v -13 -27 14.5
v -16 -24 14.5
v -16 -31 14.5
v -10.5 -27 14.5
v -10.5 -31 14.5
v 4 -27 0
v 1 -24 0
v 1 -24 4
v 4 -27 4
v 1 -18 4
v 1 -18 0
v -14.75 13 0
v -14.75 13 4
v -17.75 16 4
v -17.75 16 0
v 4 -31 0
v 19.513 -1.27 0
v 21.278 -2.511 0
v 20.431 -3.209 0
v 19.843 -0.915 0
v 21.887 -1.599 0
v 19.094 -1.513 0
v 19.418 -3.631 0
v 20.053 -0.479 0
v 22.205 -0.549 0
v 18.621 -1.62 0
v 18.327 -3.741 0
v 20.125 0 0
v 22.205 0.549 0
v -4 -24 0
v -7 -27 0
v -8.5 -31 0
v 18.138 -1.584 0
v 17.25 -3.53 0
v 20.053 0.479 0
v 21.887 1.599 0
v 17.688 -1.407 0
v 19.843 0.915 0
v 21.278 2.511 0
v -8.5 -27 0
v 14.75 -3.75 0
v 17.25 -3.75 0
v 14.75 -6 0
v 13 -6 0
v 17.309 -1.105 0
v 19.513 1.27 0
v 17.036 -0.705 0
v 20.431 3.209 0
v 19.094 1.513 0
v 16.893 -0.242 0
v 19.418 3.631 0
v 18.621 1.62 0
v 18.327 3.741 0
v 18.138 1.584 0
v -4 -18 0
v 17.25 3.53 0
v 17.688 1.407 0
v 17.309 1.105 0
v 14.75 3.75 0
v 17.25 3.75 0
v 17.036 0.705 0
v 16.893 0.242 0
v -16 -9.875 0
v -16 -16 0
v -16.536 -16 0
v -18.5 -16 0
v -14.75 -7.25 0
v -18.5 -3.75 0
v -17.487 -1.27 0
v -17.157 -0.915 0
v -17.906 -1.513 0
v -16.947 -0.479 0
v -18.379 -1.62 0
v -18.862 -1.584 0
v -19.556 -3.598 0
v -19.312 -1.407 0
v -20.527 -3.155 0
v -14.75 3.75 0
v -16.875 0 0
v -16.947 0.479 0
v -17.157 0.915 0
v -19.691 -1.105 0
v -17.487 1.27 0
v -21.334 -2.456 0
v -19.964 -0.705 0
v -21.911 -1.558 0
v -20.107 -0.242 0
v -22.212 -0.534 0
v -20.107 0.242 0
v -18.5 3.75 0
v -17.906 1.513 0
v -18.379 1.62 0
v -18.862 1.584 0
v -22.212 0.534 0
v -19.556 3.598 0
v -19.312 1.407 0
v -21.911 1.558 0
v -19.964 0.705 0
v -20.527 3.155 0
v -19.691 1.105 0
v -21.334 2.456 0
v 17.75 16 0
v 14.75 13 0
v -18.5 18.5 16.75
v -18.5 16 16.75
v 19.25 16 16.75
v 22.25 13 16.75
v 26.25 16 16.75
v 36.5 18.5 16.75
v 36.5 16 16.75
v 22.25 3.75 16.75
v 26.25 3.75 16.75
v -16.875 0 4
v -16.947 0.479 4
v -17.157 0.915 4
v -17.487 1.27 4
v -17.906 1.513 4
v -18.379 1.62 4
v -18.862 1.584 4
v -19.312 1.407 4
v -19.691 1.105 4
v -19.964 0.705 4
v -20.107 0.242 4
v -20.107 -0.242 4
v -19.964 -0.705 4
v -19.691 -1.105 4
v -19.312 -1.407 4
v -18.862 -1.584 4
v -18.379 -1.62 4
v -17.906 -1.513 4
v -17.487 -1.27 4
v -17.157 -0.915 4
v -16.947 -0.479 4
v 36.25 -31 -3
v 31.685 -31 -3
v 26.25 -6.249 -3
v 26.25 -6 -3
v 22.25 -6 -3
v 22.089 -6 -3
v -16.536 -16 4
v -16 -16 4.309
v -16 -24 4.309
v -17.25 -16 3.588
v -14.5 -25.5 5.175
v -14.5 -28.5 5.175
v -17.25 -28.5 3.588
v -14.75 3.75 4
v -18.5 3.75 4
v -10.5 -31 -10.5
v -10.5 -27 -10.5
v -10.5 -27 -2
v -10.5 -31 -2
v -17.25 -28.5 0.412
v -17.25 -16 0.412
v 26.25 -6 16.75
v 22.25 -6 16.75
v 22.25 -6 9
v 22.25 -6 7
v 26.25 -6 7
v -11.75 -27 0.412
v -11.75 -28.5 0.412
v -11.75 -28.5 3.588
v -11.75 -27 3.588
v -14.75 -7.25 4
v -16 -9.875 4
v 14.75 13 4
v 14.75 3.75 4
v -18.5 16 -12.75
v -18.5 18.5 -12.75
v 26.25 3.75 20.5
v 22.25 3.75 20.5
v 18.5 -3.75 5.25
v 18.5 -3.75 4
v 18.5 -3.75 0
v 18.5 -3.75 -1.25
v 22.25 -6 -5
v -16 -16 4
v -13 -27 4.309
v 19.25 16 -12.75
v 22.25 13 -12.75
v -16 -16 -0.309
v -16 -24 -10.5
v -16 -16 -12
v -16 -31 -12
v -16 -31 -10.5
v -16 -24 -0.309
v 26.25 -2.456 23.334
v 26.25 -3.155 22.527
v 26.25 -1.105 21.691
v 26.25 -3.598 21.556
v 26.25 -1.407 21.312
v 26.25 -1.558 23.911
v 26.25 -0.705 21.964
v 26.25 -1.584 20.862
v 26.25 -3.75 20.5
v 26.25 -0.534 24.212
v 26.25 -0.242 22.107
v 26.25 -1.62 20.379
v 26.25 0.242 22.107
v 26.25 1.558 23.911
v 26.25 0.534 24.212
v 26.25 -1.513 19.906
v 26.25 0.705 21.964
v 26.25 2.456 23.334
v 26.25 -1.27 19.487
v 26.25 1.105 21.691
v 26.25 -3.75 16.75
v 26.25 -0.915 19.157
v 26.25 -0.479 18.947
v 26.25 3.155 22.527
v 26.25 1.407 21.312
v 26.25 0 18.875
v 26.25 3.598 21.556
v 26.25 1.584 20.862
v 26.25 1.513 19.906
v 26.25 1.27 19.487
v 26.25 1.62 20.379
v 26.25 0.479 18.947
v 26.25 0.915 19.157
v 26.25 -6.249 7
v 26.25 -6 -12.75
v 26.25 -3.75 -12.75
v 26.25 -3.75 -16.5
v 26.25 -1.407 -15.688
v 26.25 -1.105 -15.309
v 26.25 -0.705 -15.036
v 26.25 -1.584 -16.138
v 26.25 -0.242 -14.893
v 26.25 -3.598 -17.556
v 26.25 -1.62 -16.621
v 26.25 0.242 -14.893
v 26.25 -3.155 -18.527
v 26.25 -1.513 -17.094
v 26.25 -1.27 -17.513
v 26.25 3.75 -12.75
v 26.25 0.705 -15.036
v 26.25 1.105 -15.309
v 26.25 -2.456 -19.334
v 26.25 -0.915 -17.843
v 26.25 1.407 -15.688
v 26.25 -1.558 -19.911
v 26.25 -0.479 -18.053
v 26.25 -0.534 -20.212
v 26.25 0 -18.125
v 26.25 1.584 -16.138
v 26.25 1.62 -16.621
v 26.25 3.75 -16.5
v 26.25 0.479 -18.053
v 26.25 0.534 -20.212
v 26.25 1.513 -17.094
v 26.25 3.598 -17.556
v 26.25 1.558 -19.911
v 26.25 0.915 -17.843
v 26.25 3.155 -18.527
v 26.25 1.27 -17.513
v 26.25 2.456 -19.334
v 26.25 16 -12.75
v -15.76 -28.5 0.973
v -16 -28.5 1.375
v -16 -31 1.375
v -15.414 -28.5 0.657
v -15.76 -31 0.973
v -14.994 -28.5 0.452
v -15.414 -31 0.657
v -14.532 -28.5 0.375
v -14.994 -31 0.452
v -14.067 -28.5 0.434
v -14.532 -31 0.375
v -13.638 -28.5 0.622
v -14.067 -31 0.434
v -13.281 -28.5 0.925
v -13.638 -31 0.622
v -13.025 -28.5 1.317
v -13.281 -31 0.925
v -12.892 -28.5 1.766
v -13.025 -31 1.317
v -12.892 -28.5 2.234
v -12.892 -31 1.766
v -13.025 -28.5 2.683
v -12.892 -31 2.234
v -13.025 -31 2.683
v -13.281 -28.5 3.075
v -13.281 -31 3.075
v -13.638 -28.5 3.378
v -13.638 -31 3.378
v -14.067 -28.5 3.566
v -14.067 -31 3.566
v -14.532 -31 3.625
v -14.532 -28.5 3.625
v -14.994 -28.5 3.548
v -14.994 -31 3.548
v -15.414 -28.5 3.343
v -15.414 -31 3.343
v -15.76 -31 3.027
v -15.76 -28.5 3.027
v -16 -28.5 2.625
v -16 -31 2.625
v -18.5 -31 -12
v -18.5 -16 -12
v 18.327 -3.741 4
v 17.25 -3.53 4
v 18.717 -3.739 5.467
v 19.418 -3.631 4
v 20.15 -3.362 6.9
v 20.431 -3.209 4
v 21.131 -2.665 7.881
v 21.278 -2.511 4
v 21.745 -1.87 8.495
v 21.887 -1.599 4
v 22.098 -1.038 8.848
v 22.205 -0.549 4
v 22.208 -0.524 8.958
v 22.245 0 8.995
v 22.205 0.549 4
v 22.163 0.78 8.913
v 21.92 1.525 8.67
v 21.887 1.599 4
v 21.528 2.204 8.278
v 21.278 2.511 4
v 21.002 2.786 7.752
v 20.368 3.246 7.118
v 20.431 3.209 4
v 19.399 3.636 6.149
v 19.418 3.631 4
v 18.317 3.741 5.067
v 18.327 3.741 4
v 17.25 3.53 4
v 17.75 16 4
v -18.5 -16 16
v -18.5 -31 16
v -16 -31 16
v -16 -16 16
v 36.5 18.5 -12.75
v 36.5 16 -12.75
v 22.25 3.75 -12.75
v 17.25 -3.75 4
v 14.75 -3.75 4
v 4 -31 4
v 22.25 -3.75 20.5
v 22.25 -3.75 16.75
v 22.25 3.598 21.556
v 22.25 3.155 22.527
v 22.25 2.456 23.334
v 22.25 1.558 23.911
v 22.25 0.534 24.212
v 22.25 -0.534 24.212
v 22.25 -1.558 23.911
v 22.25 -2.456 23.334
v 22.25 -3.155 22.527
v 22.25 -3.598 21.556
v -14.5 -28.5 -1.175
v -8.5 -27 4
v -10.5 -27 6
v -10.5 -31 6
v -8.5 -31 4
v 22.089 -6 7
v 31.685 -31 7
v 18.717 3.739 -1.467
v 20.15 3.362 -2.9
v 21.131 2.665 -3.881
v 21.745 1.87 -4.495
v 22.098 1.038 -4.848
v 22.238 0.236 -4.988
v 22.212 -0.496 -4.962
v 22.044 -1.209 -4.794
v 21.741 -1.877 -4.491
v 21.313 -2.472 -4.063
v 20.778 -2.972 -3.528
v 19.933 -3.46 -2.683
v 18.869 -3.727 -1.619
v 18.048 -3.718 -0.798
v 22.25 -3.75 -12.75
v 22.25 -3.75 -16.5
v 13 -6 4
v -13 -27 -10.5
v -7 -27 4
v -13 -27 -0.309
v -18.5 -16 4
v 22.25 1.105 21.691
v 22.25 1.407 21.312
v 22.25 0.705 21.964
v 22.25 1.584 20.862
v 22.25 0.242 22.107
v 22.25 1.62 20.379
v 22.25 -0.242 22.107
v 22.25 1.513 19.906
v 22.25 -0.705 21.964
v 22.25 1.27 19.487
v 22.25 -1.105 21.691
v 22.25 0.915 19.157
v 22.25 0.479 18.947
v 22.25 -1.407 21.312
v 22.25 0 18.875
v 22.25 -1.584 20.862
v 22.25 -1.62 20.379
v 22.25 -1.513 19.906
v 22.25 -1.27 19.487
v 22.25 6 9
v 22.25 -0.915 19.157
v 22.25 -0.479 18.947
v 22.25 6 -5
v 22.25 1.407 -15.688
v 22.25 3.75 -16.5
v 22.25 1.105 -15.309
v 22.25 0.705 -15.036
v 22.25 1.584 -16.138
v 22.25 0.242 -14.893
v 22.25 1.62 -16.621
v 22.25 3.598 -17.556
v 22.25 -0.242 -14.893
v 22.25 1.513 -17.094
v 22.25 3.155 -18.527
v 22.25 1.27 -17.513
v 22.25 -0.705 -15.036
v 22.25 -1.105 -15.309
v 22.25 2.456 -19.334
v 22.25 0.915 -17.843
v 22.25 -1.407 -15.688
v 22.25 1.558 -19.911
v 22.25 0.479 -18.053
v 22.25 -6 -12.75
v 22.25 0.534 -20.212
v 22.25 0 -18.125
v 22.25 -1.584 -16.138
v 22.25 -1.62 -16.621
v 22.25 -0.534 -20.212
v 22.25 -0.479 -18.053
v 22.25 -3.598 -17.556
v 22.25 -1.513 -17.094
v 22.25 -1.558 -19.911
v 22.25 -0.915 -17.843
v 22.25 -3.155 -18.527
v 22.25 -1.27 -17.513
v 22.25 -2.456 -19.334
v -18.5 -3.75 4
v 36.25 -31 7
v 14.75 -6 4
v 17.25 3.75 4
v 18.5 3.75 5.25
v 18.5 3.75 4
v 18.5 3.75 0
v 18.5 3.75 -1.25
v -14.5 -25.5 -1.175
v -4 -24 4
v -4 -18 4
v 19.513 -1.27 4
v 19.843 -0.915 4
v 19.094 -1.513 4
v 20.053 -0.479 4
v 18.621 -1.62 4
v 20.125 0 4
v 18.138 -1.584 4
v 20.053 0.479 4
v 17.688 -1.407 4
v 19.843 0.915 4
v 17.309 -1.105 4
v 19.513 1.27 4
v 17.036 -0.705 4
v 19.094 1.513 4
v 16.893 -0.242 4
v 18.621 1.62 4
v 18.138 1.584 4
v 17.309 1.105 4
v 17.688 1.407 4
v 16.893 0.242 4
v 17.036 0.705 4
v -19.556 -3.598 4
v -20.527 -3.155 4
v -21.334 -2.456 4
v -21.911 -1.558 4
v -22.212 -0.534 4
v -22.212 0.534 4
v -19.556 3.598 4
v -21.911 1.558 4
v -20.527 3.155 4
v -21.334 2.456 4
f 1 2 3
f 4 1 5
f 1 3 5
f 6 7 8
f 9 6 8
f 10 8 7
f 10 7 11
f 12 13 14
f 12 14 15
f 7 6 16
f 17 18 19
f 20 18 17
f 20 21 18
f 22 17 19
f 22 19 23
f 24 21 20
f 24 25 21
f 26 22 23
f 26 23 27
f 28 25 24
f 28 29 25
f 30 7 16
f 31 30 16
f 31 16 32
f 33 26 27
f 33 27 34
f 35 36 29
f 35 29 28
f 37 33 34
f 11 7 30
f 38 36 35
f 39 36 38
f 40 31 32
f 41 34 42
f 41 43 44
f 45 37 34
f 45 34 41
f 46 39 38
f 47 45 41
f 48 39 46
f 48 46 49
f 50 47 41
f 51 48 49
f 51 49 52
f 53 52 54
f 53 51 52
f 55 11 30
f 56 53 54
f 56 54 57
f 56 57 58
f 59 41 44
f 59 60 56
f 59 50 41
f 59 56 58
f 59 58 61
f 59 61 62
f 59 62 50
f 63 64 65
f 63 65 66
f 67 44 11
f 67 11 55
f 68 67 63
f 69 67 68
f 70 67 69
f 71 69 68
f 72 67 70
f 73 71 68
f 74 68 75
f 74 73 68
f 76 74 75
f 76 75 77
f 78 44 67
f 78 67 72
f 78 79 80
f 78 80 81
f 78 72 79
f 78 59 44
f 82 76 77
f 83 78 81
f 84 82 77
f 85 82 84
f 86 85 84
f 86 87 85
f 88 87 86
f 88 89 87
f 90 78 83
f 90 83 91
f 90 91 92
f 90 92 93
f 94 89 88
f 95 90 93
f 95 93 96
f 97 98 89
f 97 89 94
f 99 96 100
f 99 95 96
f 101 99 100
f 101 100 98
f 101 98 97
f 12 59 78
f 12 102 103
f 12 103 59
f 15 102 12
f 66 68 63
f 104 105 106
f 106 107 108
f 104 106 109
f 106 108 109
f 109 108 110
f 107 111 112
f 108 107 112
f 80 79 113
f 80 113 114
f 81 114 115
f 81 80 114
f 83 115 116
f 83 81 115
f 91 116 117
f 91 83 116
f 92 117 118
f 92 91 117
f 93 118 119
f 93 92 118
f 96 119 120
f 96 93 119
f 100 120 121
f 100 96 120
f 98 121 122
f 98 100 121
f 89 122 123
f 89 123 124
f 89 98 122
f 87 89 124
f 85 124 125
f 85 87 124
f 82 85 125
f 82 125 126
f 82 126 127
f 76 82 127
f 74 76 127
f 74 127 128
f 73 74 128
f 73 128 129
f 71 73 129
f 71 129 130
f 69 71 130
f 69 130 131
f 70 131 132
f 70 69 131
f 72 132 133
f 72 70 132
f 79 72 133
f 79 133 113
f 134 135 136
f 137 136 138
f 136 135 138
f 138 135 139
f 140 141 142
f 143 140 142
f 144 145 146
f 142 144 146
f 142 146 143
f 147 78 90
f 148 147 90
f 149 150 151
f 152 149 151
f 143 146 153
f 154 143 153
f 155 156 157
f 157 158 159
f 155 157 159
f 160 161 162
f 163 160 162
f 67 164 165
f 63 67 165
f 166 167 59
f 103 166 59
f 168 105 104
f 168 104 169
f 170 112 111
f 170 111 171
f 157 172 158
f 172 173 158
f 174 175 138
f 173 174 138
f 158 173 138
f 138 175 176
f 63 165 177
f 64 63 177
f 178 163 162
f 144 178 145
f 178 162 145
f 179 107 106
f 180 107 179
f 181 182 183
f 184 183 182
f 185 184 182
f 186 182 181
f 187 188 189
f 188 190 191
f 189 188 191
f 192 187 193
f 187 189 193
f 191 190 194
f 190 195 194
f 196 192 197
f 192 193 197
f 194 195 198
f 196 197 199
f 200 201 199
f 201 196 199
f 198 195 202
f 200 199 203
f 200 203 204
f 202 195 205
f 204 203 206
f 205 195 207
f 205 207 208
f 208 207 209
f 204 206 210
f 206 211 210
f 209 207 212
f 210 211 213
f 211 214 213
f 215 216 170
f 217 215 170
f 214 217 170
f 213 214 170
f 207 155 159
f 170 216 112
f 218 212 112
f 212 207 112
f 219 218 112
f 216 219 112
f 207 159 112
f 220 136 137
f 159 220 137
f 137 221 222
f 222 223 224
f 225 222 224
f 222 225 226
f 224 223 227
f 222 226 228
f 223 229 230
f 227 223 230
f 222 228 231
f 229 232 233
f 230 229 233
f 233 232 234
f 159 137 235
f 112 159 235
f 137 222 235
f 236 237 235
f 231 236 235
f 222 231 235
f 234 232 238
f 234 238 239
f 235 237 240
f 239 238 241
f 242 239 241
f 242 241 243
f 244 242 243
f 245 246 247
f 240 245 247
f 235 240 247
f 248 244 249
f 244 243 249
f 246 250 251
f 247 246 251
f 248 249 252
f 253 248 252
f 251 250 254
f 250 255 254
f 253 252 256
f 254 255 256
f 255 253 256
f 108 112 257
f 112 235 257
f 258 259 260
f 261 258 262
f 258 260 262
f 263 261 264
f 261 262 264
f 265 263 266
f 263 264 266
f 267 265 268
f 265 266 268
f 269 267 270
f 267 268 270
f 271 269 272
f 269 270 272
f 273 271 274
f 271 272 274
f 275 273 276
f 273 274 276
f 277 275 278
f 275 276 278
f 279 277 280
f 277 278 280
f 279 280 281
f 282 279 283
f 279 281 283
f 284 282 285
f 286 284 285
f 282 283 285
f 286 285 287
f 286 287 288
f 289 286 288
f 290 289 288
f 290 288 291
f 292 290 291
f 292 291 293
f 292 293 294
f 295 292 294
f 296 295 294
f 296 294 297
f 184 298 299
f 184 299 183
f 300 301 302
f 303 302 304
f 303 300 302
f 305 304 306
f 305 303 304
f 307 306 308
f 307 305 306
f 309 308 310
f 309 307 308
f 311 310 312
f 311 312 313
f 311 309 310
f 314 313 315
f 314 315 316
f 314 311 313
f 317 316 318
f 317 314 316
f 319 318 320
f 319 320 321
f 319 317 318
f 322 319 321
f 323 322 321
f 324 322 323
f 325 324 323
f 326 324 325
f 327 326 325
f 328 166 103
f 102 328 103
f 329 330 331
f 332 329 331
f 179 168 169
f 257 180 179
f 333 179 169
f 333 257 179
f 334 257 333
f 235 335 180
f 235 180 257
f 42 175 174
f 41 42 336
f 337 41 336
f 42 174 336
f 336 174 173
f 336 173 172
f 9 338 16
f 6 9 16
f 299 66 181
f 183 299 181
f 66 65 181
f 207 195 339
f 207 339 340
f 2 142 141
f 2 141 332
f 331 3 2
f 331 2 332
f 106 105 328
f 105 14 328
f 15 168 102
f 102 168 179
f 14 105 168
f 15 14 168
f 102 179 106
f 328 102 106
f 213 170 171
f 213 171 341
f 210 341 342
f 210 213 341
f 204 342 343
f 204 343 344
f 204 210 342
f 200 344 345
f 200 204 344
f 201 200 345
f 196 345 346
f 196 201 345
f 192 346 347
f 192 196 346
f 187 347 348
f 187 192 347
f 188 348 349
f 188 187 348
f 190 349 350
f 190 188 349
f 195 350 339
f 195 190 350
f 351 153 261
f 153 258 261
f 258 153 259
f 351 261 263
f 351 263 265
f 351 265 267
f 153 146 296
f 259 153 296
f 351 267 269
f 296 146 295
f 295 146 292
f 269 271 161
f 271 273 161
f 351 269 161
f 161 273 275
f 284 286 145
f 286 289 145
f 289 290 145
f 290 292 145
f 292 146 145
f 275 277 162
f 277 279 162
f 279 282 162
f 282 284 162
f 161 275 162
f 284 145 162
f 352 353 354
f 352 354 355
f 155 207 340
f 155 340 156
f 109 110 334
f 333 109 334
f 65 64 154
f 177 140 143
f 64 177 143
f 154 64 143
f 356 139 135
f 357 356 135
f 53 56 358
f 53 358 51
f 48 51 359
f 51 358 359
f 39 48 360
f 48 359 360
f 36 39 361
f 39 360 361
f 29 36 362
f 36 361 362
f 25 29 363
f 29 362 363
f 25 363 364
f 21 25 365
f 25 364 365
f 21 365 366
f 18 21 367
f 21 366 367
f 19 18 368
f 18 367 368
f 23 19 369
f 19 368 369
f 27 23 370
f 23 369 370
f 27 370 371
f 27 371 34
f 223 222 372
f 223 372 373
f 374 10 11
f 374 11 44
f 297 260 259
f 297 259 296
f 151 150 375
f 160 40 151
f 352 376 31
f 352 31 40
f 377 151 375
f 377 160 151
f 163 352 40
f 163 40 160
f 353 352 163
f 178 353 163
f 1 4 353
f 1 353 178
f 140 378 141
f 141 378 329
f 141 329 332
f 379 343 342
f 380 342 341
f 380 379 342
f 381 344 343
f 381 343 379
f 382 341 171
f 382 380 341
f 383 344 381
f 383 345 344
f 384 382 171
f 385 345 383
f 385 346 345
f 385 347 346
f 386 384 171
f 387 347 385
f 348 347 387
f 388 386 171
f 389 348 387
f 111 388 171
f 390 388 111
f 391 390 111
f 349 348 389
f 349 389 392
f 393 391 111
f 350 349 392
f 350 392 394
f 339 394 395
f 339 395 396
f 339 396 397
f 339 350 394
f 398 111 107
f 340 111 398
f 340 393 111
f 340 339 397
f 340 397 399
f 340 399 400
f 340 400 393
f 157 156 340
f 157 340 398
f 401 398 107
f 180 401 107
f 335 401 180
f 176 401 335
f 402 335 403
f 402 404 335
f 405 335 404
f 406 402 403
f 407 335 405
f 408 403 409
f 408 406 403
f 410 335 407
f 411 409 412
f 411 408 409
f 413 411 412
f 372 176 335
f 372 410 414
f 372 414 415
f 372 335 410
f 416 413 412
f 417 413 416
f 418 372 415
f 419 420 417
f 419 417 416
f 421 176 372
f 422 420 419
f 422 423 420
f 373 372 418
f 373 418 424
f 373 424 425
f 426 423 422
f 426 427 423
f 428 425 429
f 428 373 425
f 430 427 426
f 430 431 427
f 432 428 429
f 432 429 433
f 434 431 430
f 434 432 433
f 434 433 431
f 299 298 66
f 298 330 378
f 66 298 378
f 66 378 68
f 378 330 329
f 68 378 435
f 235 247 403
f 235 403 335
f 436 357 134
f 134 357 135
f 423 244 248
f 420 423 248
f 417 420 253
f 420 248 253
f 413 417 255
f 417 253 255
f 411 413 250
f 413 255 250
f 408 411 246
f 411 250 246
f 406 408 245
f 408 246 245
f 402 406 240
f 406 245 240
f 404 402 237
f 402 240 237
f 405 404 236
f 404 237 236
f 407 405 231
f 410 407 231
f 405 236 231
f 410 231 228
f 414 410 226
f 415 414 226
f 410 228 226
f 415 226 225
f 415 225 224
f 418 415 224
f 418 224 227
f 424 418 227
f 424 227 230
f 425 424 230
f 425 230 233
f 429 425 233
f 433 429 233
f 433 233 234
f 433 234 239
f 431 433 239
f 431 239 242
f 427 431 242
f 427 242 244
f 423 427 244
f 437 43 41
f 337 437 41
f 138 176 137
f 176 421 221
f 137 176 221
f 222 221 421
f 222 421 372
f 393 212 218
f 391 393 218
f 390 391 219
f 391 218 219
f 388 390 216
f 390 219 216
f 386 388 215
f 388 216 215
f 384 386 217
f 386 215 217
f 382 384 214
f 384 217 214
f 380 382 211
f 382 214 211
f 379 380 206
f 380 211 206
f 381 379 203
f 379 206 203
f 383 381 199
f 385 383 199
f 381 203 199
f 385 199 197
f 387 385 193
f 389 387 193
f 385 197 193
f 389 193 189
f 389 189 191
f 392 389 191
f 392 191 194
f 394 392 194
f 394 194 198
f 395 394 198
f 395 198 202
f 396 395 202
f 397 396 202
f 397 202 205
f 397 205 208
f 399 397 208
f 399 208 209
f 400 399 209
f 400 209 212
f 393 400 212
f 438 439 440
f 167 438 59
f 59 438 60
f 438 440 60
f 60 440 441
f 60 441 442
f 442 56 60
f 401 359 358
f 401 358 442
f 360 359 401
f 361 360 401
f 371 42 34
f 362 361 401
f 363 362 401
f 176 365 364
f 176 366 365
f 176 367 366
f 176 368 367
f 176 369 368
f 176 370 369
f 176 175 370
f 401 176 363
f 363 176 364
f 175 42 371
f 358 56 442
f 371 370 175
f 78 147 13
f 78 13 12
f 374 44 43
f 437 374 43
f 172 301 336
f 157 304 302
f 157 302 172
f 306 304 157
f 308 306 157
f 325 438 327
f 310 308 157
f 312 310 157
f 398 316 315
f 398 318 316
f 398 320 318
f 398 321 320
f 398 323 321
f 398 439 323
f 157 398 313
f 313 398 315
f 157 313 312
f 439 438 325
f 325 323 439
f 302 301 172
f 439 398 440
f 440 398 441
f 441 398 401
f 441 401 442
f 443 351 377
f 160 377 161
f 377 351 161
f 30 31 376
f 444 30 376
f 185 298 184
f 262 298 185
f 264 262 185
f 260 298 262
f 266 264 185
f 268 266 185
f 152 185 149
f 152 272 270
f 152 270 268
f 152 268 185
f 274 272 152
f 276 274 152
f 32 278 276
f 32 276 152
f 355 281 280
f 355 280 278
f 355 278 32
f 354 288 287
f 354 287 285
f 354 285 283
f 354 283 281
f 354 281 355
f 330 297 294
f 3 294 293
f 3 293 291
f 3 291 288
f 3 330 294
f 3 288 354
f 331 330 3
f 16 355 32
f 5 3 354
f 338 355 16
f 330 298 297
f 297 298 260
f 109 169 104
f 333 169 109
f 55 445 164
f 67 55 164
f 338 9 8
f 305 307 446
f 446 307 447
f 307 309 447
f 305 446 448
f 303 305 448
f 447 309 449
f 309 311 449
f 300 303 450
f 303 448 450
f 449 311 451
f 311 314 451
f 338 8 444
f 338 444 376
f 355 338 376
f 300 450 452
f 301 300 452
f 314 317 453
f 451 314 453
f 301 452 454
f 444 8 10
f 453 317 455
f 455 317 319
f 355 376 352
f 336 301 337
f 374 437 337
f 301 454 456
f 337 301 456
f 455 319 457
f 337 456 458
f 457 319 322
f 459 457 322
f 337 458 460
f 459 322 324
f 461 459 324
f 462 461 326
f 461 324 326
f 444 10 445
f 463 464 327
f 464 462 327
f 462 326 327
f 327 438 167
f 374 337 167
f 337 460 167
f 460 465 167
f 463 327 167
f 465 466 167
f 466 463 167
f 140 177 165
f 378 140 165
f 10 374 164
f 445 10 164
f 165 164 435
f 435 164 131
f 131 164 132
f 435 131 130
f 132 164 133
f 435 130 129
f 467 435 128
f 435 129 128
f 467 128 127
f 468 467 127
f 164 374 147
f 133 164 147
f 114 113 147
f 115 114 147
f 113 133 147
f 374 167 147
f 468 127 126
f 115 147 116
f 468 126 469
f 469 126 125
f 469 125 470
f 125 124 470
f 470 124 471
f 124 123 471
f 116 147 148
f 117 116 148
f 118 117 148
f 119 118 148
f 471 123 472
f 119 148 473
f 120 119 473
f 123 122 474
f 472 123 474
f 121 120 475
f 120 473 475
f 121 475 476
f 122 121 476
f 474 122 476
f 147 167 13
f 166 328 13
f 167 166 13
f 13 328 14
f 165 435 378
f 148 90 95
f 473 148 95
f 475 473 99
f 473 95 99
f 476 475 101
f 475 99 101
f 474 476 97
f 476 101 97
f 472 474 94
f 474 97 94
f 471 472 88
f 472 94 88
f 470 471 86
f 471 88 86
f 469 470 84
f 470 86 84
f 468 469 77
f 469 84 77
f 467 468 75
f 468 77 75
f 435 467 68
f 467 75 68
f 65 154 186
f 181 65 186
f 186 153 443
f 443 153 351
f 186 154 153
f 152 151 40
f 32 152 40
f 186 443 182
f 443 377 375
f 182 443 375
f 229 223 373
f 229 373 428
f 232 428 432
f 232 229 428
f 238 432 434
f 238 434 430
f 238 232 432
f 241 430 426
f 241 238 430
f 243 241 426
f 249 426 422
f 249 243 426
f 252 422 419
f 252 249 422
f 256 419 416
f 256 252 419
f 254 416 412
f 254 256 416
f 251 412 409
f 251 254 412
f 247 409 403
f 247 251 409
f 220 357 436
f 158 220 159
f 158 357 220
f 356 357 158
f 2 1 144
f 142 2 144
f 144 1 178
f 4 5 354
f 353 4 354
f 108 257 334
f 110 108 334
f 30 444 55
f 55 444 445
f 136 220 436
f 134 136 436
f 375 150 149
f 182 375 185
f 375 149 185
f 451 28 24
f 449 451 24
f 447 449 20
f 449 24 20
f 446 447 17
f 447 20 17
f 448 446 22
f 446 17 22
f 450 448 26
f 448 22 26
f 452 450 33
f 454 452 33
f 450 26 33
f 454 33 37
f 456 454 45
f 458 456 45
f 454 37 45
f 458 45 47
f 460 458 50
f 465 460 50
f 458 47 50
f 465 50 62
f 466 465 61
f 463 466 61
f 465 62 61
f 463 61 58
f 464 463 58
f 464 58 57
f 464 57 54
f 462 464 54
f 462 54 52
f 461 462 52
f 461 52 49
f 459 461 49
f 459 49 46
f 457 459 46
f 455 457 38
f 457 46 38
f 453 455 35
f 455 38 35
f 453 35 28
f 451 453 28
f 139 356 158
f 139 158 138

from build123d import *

# Parameters (mm, degrees)
CROQUIS1_R                   = 1.625
SALIENTE_EXTRUIR1_DEPTH      = 4
CROQUIS2_W                   = 5
CROQUIS2_H                   = 25
SALIENTE_EXTRUIR2_DEPTH      = 4
CROQUIS3_R                   = 1.625
SALIENTE_EXTRUIR3_DEPTH      = 4
CHAFL_N1_SIZE                = 3
CHAFL_N2_SIZE                = 1.5
SALIENTE_EXTRUIR4_DEPTH      = 21
SALIENTE_EXTRUIR4_DEPTH_BACK = 25
CROQUIS4_W                   = 7.75
CROQUIS4_H                   = 12
CORTAR_EXTRUIR1_DEPTH        = 52.798286651
CORTAR_EXTRUIR1_DEPTH_BACK   = 52.798286651
CROQUIS5_W                   = 3.75
CROQUIS5_H                   = 21
CORTAR_EXTRUIR2_DEPTH        = 48.697615244
CORTAR_EXTRUIR2_DEPTH_BACK   = 48.697615244
CROQUIS6_R                   = 1.625
CHAFL_N4_SIZE                = 5
CROQUIS7_R                   = 3.745
CORTAR_EXTRUIR5_DEPTH        = 22
CORTAR_EXTRUIR6_START        = 22
CROQUIS8_R                   = 3.745
CORTAR_EXTRUIR6_DEPTH        = 22
CORTAR_EXTRUIR7_DEPTH        = 22
CROQUIS10_R                  = 1.625
CORTAR_EXTRUIR8_DEPTH        = 22
CHAFL_N5_SIZE                = 12
CROQUIS11_W                  = 2.5
CROQUIS11_H                  = 28
SALIENTE_EXTRUIR5_DEPTH      = 15
CHAFL_N6_SIZE                = 3
CORTAR_EXTRUIR9_REACH        = 55.94
CORTAR_EXTRUIR9_START        = -2.5
CORTAR_EXTRUIR10_DEPTH       = 10
SALIENTE_EXTRUIR6_DEPTH      = 10
SALIENTE_EXTRUIR6_DEPTH_BACK = 8
CROQUIS14_W                  = 10
CROQUIS14_H                  = 25
CROQUIS15_W                  = 29.5
CROQUIS15_H                  = 4
CROQUIS15_W_2                = 4
CROQUIS15_H_2                = 29.5
SALIENTE_EXTRUIR7_DEPTH      = 10
CROQUIS16_W                  = 55
CROQUIS16_H                  = 29.5
SALIENTE_EXTRUIR8_DEPTH      = 2.5
CHAFL_N7_SIZE                = 3
SALIENTE_EXTRUIR9_DEPTH      = 4
CHAFL_N11_SIZE               = 3
CHAFL_N12_SIZE               = 10.100655646
CHAFL_N12_SIZE_2             = 25
CHAFL_N14_SIZE               = 35
CHAFL_N14_SIZE_2             = 13.435241226


# Some blends are built 0.0001 mm under size
with BuildPart() as part:
    # Croquis1 → Saliente-Extruir1 (new body)
    with BuildSketch(Plane.XY):
        with BuildLine():
            Line((-14.75, 6), (-14.75, 3.75))
            Line((-14.75, 3.75), (-18.5, 3.75))
            ThreePointArc((-18.5, 3.75), (-22.25, 0), (-18.5, -3.75))
            Line((-18.5, -3.75), (-14.75, -3.75))
            Line((-14.75, -3.75), (-14.75, -6))
            Line((-14.75, -6), (14.75, -6))
            Line((14.75, -6), (14.75, -3.75))
            Line((14.75, -3.75), (18.5, -3.75))
            ThreePointArc((18.5, -3.75), (22.25, 0), (18.5, 3.75))
            Line((18.5, 3.75), (14.75, 3.75))
            Line((14.75, 3.75), (14.75, 6))
            Line((14.75, 6), (-14.75, 6))
        make_face()
        with Locations((-18.5, 0)):
            Circle(CROQUIS1_R, mode=Mode.SUBTRACT)
        with Locations((18.5, 0)):
            Circle(CROQUIS1_R, mode=Mode.SUBTRACT)
    extrude(amount=SALIENTE_EXTRUIR1_DEPTH)

    # Croquis2 → Saliente-Extruir2 (add)
    with BuildSketch(Plane.XY.offset(4)):
        with Locations((-1.5, -18.5)):
            Rectangle(CROQUIS2_W, CROQUIS2_H)
    extrude(amount=-SALIENTE_EXTRUIR2_DEPTH)

    # Croquis3 → Saliente-Extruir3 (add)
    with BuildSketch(Plane.XZ.offset(31)):
        Polygon((-10.5, -1.5), (-10.5, -10.5), (-18.5, -10.5), (-18.5, 14.5), (-10.5, 14.5), (-10.5, 5.5), (4, 5.5), (4, -1.5), align=None)
        with Locations(Location((-14.5, 2, 0), (0, 0, 270))):
            Circle(CROQUIS3_R, mode=Mode.SUBTRACT)
    extrude(amount=-SALIENTE_EXTRUIR3_DEPTH)

    # Chaflán1
    chafl_n1_edges = [part.edges().sort_by_distance(p)[0] for p in [
        (-4, -27, 2),
    ]]
    chamfer(chafl_n1_edges, length=CHAFL_N1_SIZE)

    # Chaflán2
    chafl_n2_edges = [part.edges().sort_by_distance(p)[0] for p in [
        (-10.5, -29, -1.5),
        (-10.5, -29, 5.5),
    ]]
    chamfer(chafl_n2_edges, length=CHAFL_N2_SIZE)

    # Croquis4 → Saliente-Extruir4 (add, two sides: drawn at the far end of the back side and taken through both)
    with BuildSketch(Plane.XY.offset(4).offset(-SALIENTE_EXTRUIR4_DEPTH_BACK)):
        with Locations((22.375, 0)):
            Rectangle(CROQUIS4_W, CROQUIS4_H)
    extrude(amount=SALIENTE_EXTRUIR4_DEPTH + SALIENTE_EXTRUIR4_DEPTH_BACK)

    # Croquis5 → Cortar-Extruir1 (cut, two sides: drawn at the far end of the back side and taken through both)
    with BuildSketch(Plane(origin=(0, 6, 0), x_dir=(1, 0, 0), z_dir=(0, 1, 0)).offset(-CORTAR_EXTRUIR1_DEPTH_BACK)):
        with Locations((20.375, 10.5)):
            Rectangle(CROQUIS5_W, CROQUIS5_H)
        with Locations((20.375, -14.5)):
            Rectangle(CROQUIS5_W, CROQUIS5_H)
    extrude(amount=CORTAR_EXTRUIR1_DEPTH + CORTAR_EXTRUIR1_DEPTH_BACK, mode=Mode.SUBTRACT)

    # Croquis6 → Cortar-Extruir2 (cut, two sides: drawn at the far end of the back side and taken through both)
    with BuildSketch(Plane.XY.offset(4).offset(-CORTAR_EXTRUIR2_DEPTH_BACK)):
        with Locations((18.5, 0)):
            Circle(CROQUIS6_R)
        Polygon((18.5, 3.75), (22.25, 6), (18.5, 6), align=None)
        Polygon((18.5, -3.75), (22.25, -6), (18.5, -6), align=None)
    extrude(amount=CORTAR_EXTRUIR2_DEPTH + CORTAR_EXTRUIR2_DEPTH_BACK, mode=Mode.SUBTRACT)

    # Chaflán4
    # the kernel refuses this chamfer: 5 mm, written as the material it adds along each edge
    with BuildSketch(Plane(origin=(22.25, -6, 0), x_dir=(-0.9996219169112968, 0, 0.027495876610586372), z_dir=(0, 1, 0))) as chafl_n4_piece_1_section:
        Polygon((CHAFL_N4_SIZE * 0.999621916911, -CHAFL_N4_SIZE * 0.0274958766106), (-CHAFL_N4_SIZE * 0.0274958766106, -CHAFL_N4_SIZE * 0.999621916911), (0, 0), align=None)
    chafl_n4_piece_1 = extrude(amount=12, mode=Mode.PRIVATE)
    chafl_n4_piece_1 = split(chafl_n4_piece_1, bisect_by=Plane(origin=(20.922110661, -5.203266397, -2.017665357), z_dir=(0.5144957554275262, 0.8574929257125444, 0)), keep=Keep.TOP, mode=Mode.PRIVATE)
    chafl_n4_piece_1 = split(chafl_n4_piece_1, bisect_by=Plane(origin=(21.29244932, -3.75, -2.017665357), z_dir=(0, -1, 0)), keep=Keep.TOP, mode=Mode.PRIVATE)
    add(chafl_n4_piece_1)
    with BuildSketch(Plane(origin=(22.25, -6, 0), x_dir=(-0.9996219169112968, 0, 0.027495876610586372), z_dir=(0, 1, 0))) as chafl_n4_piece_2_section:
        Polygon((CHAFL_N4_SIZE * 0.999621916911, -CHAFL_N4_SIZE * 0.0274958766106), (-CHAFL_N4_SIZE * 0.0274958766106, -CHAFL_N4_SIZE * 0.999621916911), (0, 0), align=None)
    chafl_n4_piece_2 = extrude(amount=12, mode=Mode.PRIVATE)
    chafl_n4_piece_2 = split(chafl_n4_piece_2, bisect_by=Plane(origin=(17.859122077, -3.365473246, -0.159071565), z_dir=(-0.5144957554275262, -0.8574929257125444, 0)), keep=Keep.TOP, mode=Mode.PRIVATE)
    chafl_n4_piece_2 = split(chafl_n4_piece_2, bisect_by=Plane(origin=(17.761361038, -3.75, -0.159071565), z_dir=(0, 1, 0)), keep=Keep.TOP, mode=Mode.PRIVATE)
    add(chafl_n4_piece_2)
    with BuildSketch(Plane(origin=(22.25, -6, 0), x_dir=(-0.9996219169112968, 0, 0.027495876610586372), z_dir=(0, 1, 0))) as chafl_n4_piece_3_section:
        Polygon((CHAFL_N4_SIZE * 0.999621916911, -CHAFL_N4_SIZE * 0.0274958766106), (-CHAFL_N4_SIZE * 0.0274958766106, -CHAFL_N4_SIZE * 0.999621916911), (0, 0), align=None)
    chafl_n4_piece_3 = extrude(amount=12, mode=Mode.PRIVATE)
    chafl_n4_piece_3 = split(chafl_n4_piece_3, bisect_by=Plane(origin=(20.83228479, 3.75, -1.77005128), z_dir=(0, -1, 0)), keep=Keep.TOP, mode=Mode.PRIVATE)
    chafl_n4_piece_3 = split(chafl_n4_piece_3, bisect_by=Plane(origin=(18.560503744, 3.786302247, -1.77005128), z_dir=(0.5144957554275259, -0.8574929257125447, 0)), keep=Keep.TOP, mode=Mode.PRIVATE)
    chafl_n4_piece_3 = split(chafl_n4_piece_3, bisect_by=Plane(origin=(18.560503299, -3.786301979, -1.77005128), z_dir=(0.5144957554275262, 0.8574929257125444, 0)), keep=Keep.TOP, mode=Mode.PRIVATE)
    chafl_n4_piece_3 = split(chafl_n4_piece_3, bisect_by=Plane(origin=(20.83228479, -3.75, -1.77005128), z_dir=(0, 1, 0)), keep=Keep.TOP, mode=Mode.PRIVATE)
    chafl_n4_piece_3 = chafl_n4_piece_3 - Plane(origin=(18.5, 0, -1.77005128), x_dir=(1, 0, 0), z_dir=(0, 0, -1)) * Cylinder(1.625, 44, mode=Mode.PRIVATE)
    add(chafl_n4_piece_3)
    with BuildSketch(Plane(origin=(22.25, -6, 0), x_dir=(-0.9996219169112968, 0, 0.027495876610586372), z_dir=(0, 1, 0))) as chafl_n4_piece_4_section:
        Polygon((CHAFL_N4_SIZE * 0.999621916911, -CHAFL_N4_SIZE * 0.0274958766106), (-CHAFL_N4_SIZE * 0.0274958766106, -CHAFL_N4_SIZE * 0.999621916911), (0, 0), align=None)
    chafl_n4_piece_4 = extrude(amount=12, mode=Mode.PRIVATE)
    chafl_n4_piece_4 = split(chafl_n4_piece_4, bisect_by=Plane(origin=(21.29244932, 3.75, -2.017665357), z_dir=(0, 1, 0)), keep=Keep.TOP, mode=Mode.PRIVATE)
    chafl_n4_piece_4 = split(chafl_n4_piece_4, bisect_by=Plane(origin=(20.922110661, 5.203266397, -2.017665357), z_dir=(0.5144957554275259, -0.8574929257125447, 0)), keep=Keep.TOP, mode=Mode.PRIVATE)
    add(chafl_n4_piece_4)
    with BuildSketch(Plane(origin=(22.25, -6, 0), x_dir=(-0.9996219169112968, 0, 0.027495876610586372), z_dir=(0, 1, 0))) as chafl_n4_piece_5_section:
        Polygon((CHAFL_N4_SIZE * 0.999621916911, -CHAFL_N4_SIZE * 0.0274958766106), (-CHAFL_N4_SIZE * 0.0274958766106, -CHAFL_N4_SIZE * 0.999621916911), (0, 0), align=None)
    chafl_n4_piece_5 = extrude(amount=12, mode=Mode.PRIVATE)
    chafl_n4_piece_5 = split(chafl_n4_piece_5, bisect_by=Plane(origin=(17.761361038, 3.75, -0.159071565), z_dir=(0, -1, 0)), keep=Keep.TOP, mode=Mode.PRIVATE)
    chafl_n4_piece_5 = split(chafl_n4_piece_5, bisect_by=Plane(origin=(17.859122077, 3.365473246, -0.159071565), z_dir=(-0.5144957554275259, 0.8574929257125447, 0)), keep=Keep.TOP, mode=Mode.PRIVATE)
    add(chafl_n4_piece_5)
    with BuildSketch(Plane(origin=(22.25, 6, 4), x_dir=(-0.9996219169112968, 0, -0.027495876610586403), z_dir=(0, -1, 0))) as chafl_n4_piece_6_section:
        Polygon((CHAFL_N4_SIZE * 0.999621916911, -CHAFL_N4_SIZE * 0.0274958766106), (-CHAFL_N4_SIZE * 0.0274958766106, -CHAFL_N4_SIZE * 0.999621916911), (0, 0), align=None)
    chafl_n4_piece_6 = extrude(amount=12, mode=Mode.PRIVATE)
    chafl_n4_piece_6 = split(chafl_n4_piece_6, bisect_by=Plane(origin=(21.29244932, 3.75, 6.017665357), z_dir=(0, 1, 0)), keep=Keep.TOP, mode=Mode.PRIVATE)
    chafl_n4_piece_6 = split(chafl_n4_piece_6, bisect_by=Plane(origin=(20.922110661, 5.203266397, 6.017665357), z_dir=(0.5144957554275259, -0.8574929257125447, 0)), keep=Keep.TOP, mode=Mode.PRIVATE)
    add(chafl_n4_piece_6)
    with BuildSketch(Plane(origin=(22.25, 6, 4), x_dir=(-0.9996219169112968, 0, -0.027495876610586403), z_dir=(0, -1, 0))) as chafl_n4_piece_7_section:
        Polygon((CHAFL_N4_SIZE * 0.999621916911, -CHAFL_N4_SIZE * 0.0274958766106), (-CHAFL_N4_SIZE * 0.0274958766106, -CHAFL_N4_SIZE * 0.999621916911), (0, 0), align=None)
    chafl_n4_piece_7 = extrude(amount=12, mode=Mode.PRIVATE)
    chafl_n4_piece_7 = split(chafl_n4_piece_7, bisect_by=Plane(origin=(17.761361038, 3.75, 4.159071565), z_dir=(0, -1, 0)), keep=Keep.TOP, mode=Mode.PRIVATE)
    chafl_n4_piece_7 = split(chafl_n4_piece_7, bisect_by=Plane(origin=(17.859122077, 3.365473246, 4.159071565), z_dir=(-0.5144957554275259, 0.8574929257125447, 0)), keep=Keep.TOP, mode=Mode.PRIVATE)
    add(chafl_n4_piece_7)
    with BuildSketch(Plane(origin=(22.25, 6, 4), x_dir=(-0.9996219169112968, 0, -0.027495876610586403), z_dir=(0, -1, 0))) as chafl_n4_piece_8_section:
        Polygon((CHAFL_N4_SIZE * 0.999621916911, -CHAFL_N4_SIZE * 0.0274958766106), (-CHAFL_N4_SIZE * 0.0274958766106, -CHAFL_N4_SIZE * 0.999621916911), (0, 0), align=None)
    chafl_n4_piece_8 = extrude(amount=12, mode=Mode.PRIVATE)
    chafl_n4_piece_8 = split(chafl_n4_piece_8, bisect_by=Plane(origin=(20.832284794, 3.75, 5.770051284), z_dir=(0, -1, 0)), keep=Keep.TOP, mode=Mode.PRIVATE)
    chafl_n4_piece_8 = split(chafl_n4_piece_8, bisect_by=Plane(origin=(18.560503747, 3.786302248, 5.770051284), z_dir=(0.5144957554275259, -0.8574929257125447, 0)), keep=Keep.TOP, mode=Mode.PRIVATE)
    chafl_n4_piece_8 = split(chafl_n4_piece_8, bisect_by=Plane(origin=(18.560503303, -3.786301982, 5.770051284), z_dir=(0.5144957554275262, 0.8574929257125444, 0)), keep=Keep.TOP, mode=Mode.PRIVATE)
    chafl_n4_piece_8 = split(chafl_n4_piece_8, bisect_by=Plane(origin=(20.832284794, -3.75, 5.770051284), z_dir=(0, 1, 0)), keep=Keep.TOP, mode=Mode.PRIVATE)
    chafl_n4_piece_8 = chafl_n4_piece_8 - Plane(origin=(18.5, 0, 5.770051284), x_dir=(1, 0, 0), z_dir=(0, 0, -1)) * Cylinder(1.625, 44, mode=Mode.PRIVATE)
    add(chafl_n4_piece_8)
    with BuildSketch(Plane(origin=(22.25, 6, 4), x_dir=(-0.9996219169112968, 0, -0.027495876610586403), z_dir=(0, -1, 0))) as chafl_n4_piece_9_section:
        Polygon((CHAFL_N4_SIZE * 0.999621916911, -CHAFL_N4_SIZE * 0.0274958766106), (-CHAFL_N4_SIZE * 0.0274958766106, -CHAFL_N4_SIZE * 0.999621916911), (0, 0), align=None)
    chafl_n4_piece_9 = extrude(amount=12, mode=Mode.PRIVATE)
    chafl_n4_piece_9 = split(chafl_n4_piece_9, bisect_by=Plane(origin=(20.922110661, -5.203266397, 6.017665357), z_dir=(0.5144957554275262, 0.8574929257125444, 0)), keep=Keep.TOP, mode=Mode.PRIVATE)
    chafl_n4_piece_9 = split(chafl_n4_piece_9, bisect_by=Plane(origin=(21.29244932, -3.75, 6.017665357), z_dir=(0, -1, 0)), keep=Keep.TOP, mode=Mode.PRIVATE)
    add(chafl_n4_piece_9)
    with BuildSketch(Plane(origin=(22.25, 6, 4), x_dir=(-0.9996219169112968, 0, -0.027495876610586403), z_dir=(0, -1, 0))) as chafl_n4_piece_10_section:
        Polygon((CHAFL_N4_SIZE * 0.999621916911, -CHAFL_N4_SIZE * 0.0274958766106), (-CHAFL_N4_SIZE * 0.0274958766106, -CHAFL_N4_SIZE * 0.999621916911), (0, 0), align=None)
    chafl_n4_piece_10 = extrude(amount=12, mode=Mode.PRIVATE)
    chafl_n4_piece_10 = split(chafl_n4_piece_10, bisect_by=Plane(origin=(17.859122077, -3.365473246, 4.159071565), z_dir=(-0.5144957554275262, -0.8574929257125444, 0)), keep=Keep.TOP, mode=Mode.PRIVATE)
    chafl_n4_piece_10 = split(chafl_n4_piece_10, bisect_by=Plane(origin=(17.761361038, -3.75, 4.159071565), z_dir=(0, 1, 0)), keep=Keep.TOP, mode=Mode.PRIVATE)
    add(chafl_n4_piece_10)

    # Croquis7 → Cortar-Extruir5 (cut)
    with BuildSketch(Plane.XY.offset(4)):
        with Locations((18.5, 0)):
            Circle(CROQUIS7_R)
    extrude(amount=CORTAR_EXTRUIR5_DEPTH, mode=Mode.SUBTRACT)

    # Croquis8 → Cortar-Extruir6 (cut)
    with BuildSketch(Plane(origin=(0, 0, 0), x_dir=(-1, 0, 0), z_dir=(0, 0, -1)).offset(CORTAR_EXTRUIR6_START)):
        with Locations((-18.5, 0)):
            Circle(CROQUIS8_R)
    extrude(amount=-CORTAR_EXTRUIR6_DEPTH, mode=Mode.SUBTRACT)

    # Croquis9 → Cortar-Extruir7 (cut)
    with BuildSketch(Plane(origin=(26.25, 0, 0), x_dir=(0, 0, -1), z_dir=(1, 0, 0))):
        with BuildLine():
            Line((-16.75, 6), (-16.75, 3.75))
            Line((-16.75, 3.75), (-20.5, 3.75))
            ThreePointArc((-20.5, 3.75), (-24.25, 0), (-20.5, -3.75))
            Line((-20.5, -3.75), (-16.75, -3.75))
            Line((-16.75, -3.75), (-16.75, -6))
            Line((-16.75, -6), (-25, -6))
            Line((-25, -6), (-25, 6))
            Line((-25, 6), (-16.75, 6))
        make_face()
        with BuildLine():
            Line((12.75, -6), (12.75, -3.75))
            Line((12.75, -3.75), (16.5, -3.75))
            ThreePointArc((16.5, -3.75), (20.25, 0), (16.5, 3.75))
            Line((16.5, 3.75), (12.75, 3.75))
            Line((12.75, 3.75), (12.75, 6))
            Line((12.75, 6), (21, 6))
            Line((21, 6), (21, -6))
            Line((21, -6), (12.75, -6))
        make_face()
    extrude(amount=-CORTAR_EXTRUIR7_DEPTH, mode=Mode.SUBTRACT)

    # Croquis10 → Cortar-Extruir8 (cut)
    with BuildSketch(Plane(origin=(26.25, 0, 0), x_dir=(0, 0, -1), z_dir=(1, 0, 0))):
        with Locations((-20.5, 0)):
            Circle(CROQUIS10_R)
        with Locations((16.5, 0)):
            Circle(CROQUIS10_R)
    extrude(amount=-CORTAR_EXTRUIR8_DEPTH, mode=Mode.SUBTRACT)

    # Chaflán5
    # the kernel refuses this chamfer: 12 mm, written as the material it adds along each edge
    with BuildSketch(Plane(origin=(-4, -6, 4), x_dir=(0.02749587661058656, -0.9996219169112968, 0), z_dir=(0, 0, -1))) as chafl_n5_piece_1_section:
        Polygon((CHAFL_N5_SIZE * 0.999621916911, CHAFL_N5_SIZE * 0.0274958766106), (-CHAFL_N5_SIZE * 0.0274958766106, CHAFL_N5_SIZE * 0.999621916911), (0, 0), align=None)
    chafl_n5_piece_1 = extrude(amount=4, mode=Mode.PRIVATE)
    chafl_n5_piece_1 = split(chafl_n5_piece_1, bisect_by=Plane(origin=(-14.75, -10.034768689, 2), z_dir=(1, 0, 0)), keep=Keep.TOP, mode=Mode.PRIVATE)
    add(chafl_n5_piece_1)
    with BuildSketch(Plane(origin=(1, -6, 4), x_dir=(-0.027495876610586226, -0.9996219169112968, 0), z_dir=(0, 0, -1))) as chafl_n5_piece_2:
        Polygon((CHAFL_N5_SIZE * 0.999621916911, -CHAFL_N5_SIZE * 0.0274958766106), (-CHAFL_N5_SIZE * 0.0274958766106, -CHAFL_N5_SIZE * 0.999621916911), (0, 0), align=None)
    extrude(amount=4)

    # Croquis11 → Saliente-Extruir5 (add)
    with BuildSketch(Plane.XZ.offset(31)):
        with Locations((-17.25, 2)):
            Rectangle(CROQUIS11_W, CROQUIS11_H)
    extrude(amount=-SALIENTE_EXTRUIR5_DEPTH)

    # Chaflán6
    chafl_n6_edges = [part.edges().sort_by_distance(p)[0] for p in [
        (-16, -27, -4.5625),
        (-16, -27, 8.5625),
    ]]
    chamfer(chafl_n6_edges, length=CHAFL_N6_SIZE)

    # Cortar-Extruir9: up to this face of the body (flat: up to its plane)
    cortar_extruir9_end = Plane(part.part.faces().sort_by_distance((-17.25, -16, 2))[0])
    # Croquis12 → Cortar-Extruir9 (cut, up to the picked face)
    with BuildSketch(Plane.XZ.offset(31).offset(CORTAR_EXTRUIR9_START), mode=Mode.PRIVATE) as cortar_extruir9_sk1:
        Polygon((-11.75, 0.41228676), (-11.75, 3.58771324), (-14.5, 5.175426481), (-17.25, 3.58771324), (-17.25, 0.41228676), (-14.5, -1.175426481), align=None)
    cortar_extruir9_tool1 = split(extrude(cortar_extruir9_sk1.sketch, amount=-CORTAR_EXTRUIR9_REACH, mode=Mode.PRIVATE), bisect_by=cortar_extruir9_end, keep=Keep.BOTH, mode=Mode.PRIVATE)
    add(cortar_extruir9_tool1.solids().sort_by(Axis((-14.5, -28.5, 2), (0, 1, 0)))[0], mode=Mode.SUBTRACT)

    # Croquis13 → Cortar-Extruir10 (cut)
    with BuildSketch(Plane(origin=(0, -27, 0), x_dir=(1, 0, 0), z_dir=(0, 1, 0))):
        Polygon((-10.5, 3), (-10.5, 2), (-8.5, 0), (4, 0), (4, 5.164967874), align=None)
        Polygon((4, -9.164967874), (-10.5, -7), (-10.5, -6), (-8.5, -4), (4, -4), align=None)
    extrude(amount=-CORTAR_EXTRUIR10_DEPTH, mode=Mode.SUBTRACT)

    # Croquis14 → Saliente-Extruir6 (add, two sides: drawn at the far end of the back side and taken through both)
    with BuildSketch(Plane(origin=(26.25, 0, 0), x_dir=(0, 0, -1), z_dir=(1, 0, 0)).offset(-SALIENTE_EXTRUIR6_DEPTH_BACK)):
        with Locations((-2, -18.5)):
            Rectangle(CROQUIS14_W, CROQUIS14_H)
    extrude(amount=SALIENTE_EXTRUIR6_DEPTH + SALIENTE_EXTRUIR6_DEPTH_BACK)

    # Croquis15 → Saliente-Extruir7 (add)
    with BuildSketch(Plane(origin=(0, 6, 0), x_dir=(1, 0, 0), z_dir=(0, 1, 0))):
        with Locations((0, -2)):
            Rectangle(CROQUIS15_W, CROQUIS15_H)
        with Locations((24.25, -2)):
            Rectangle(CROQUIS15_W_2, CROQUIS15_H_2)
    extrude(amount=SALIENTE_EXTRUIR7_DEPTH)

    # Croquis16 → Saliente-Extruir8 (add)
    with BuildSketch(Plane(origin=(0, 16, 0), x_dir=(1, 0, 0), z_dir=(0, 1, 0))):
        with Locations((9, -2)):
            Rectangle(CROQUIS16_W, CROQUIS16_H)
    extrude(amount=SALIENTE_EXTRUIR8_DEPTH)

    # Chaflán7
    chafl_n7_edges = [part.edges().sort_by_distance(p)[0] for p in [
        (-14.75, 16, 2),
        (14.75, 16, 2),
        (22.25, 16, 2),
    ]]
    chamfer(chafl_n7_edges, length=CHAFL_N7_SIZE)

    # Croquis17 → Saliente-Extruir9 (add)
    with BuildSketch(Plane.XY.offset(4)):
        Polygon((-18.5, -16), (-18.5, -3.75), (-14.75, -3.75), (-14.75, -7.25), (-16, -9.875), (-16, -16), align=None)
    extrude(amount=-SALIENTE_EXTRUIR9_DEPTH)

    # Chaflán11
    chafl_n11_edges = [part.edges().sort_by_distance(p)[0] for p in [
        (1, -27, 2),
    ]]
    chamfer(chafl_n11_edges, length=CHAFL_N11_SIZE - 0.0001)  # a hair under: the kernel refuses the full size

    # Chaflán12
    # the kernel refuses this chamfer: 25, 10.100655646 mm, written as the material it takes off along each edge
    with BuildSketch(Plane(origin=(36.25, -6, 71.824724871), x_dir=(-0.9961057015681394, 0.08816706473193467, 0), z_dir=(0, 0, -1))) as chafl_n12_piece_1_section:
        Polygon((CHAFL_N12_SIZE * 0.996105701556, -CHAFL_N12_SIZE * 0.0881670647309), (-CHAFL_N12_SIZE_2 * 0.0881670647319, -CHAFL_N12_SIZE_2 * 0.996105701568), (0, 0), align=None)
    chafl_n12_piece_1 = extrude(amount=139.649449741, mode=Mode.PRIVATE)
    chafl_n12_piece_1 = split(chafl_n12_piece_1, bisect_by=Plane(origin=(26.25, -14.541402501, 2), z_dir=(1, 0, 0)), keep=Keep.TOP, mode=Mode.PRIVATE)
    add(chafl_n12_piece_1, mode=Mode.SUBTRACT)

    # Chaflán14
    # the kernel refuses this chamfer: 35, 13.435241226 mm, written as the material it takes off along each edge
    with BuildSketch(Plane(origin=(18.25, -31, -93.776197383), x_dir=(-0.013817364679015908, 0.9999045356599435, 0), z_dir=(0, 0, 1))) as chafl_n14_piece_1_section:
        Polygon((CHAFL_N14_SIZE * 0.99990453566, -CHAFL_N14_SIZE * 0.013817364679), (-CHAFL_N14_SIZE_2 * 0.0138173646793, -CHAFL_N14_SIZE_2 * 0.999904535678), (0, 0), align=None)
    chafl_n14_piece_1 = extrude(amount=191.552394765, mode=Mode.PRIVATE)
    chafl_n14_piece_1 = split(chafl_n14_piece_1, bisect_by=Plane(origin=(18.916666667, -6, -2.333333333), z_dir=(0, -1, 0)), keep=Keep.TOP, mode=Mode.PRIVATE)
    add(chafl_n14_piece_1, mode=Mode.SUBTRACT)


solid = part.part
